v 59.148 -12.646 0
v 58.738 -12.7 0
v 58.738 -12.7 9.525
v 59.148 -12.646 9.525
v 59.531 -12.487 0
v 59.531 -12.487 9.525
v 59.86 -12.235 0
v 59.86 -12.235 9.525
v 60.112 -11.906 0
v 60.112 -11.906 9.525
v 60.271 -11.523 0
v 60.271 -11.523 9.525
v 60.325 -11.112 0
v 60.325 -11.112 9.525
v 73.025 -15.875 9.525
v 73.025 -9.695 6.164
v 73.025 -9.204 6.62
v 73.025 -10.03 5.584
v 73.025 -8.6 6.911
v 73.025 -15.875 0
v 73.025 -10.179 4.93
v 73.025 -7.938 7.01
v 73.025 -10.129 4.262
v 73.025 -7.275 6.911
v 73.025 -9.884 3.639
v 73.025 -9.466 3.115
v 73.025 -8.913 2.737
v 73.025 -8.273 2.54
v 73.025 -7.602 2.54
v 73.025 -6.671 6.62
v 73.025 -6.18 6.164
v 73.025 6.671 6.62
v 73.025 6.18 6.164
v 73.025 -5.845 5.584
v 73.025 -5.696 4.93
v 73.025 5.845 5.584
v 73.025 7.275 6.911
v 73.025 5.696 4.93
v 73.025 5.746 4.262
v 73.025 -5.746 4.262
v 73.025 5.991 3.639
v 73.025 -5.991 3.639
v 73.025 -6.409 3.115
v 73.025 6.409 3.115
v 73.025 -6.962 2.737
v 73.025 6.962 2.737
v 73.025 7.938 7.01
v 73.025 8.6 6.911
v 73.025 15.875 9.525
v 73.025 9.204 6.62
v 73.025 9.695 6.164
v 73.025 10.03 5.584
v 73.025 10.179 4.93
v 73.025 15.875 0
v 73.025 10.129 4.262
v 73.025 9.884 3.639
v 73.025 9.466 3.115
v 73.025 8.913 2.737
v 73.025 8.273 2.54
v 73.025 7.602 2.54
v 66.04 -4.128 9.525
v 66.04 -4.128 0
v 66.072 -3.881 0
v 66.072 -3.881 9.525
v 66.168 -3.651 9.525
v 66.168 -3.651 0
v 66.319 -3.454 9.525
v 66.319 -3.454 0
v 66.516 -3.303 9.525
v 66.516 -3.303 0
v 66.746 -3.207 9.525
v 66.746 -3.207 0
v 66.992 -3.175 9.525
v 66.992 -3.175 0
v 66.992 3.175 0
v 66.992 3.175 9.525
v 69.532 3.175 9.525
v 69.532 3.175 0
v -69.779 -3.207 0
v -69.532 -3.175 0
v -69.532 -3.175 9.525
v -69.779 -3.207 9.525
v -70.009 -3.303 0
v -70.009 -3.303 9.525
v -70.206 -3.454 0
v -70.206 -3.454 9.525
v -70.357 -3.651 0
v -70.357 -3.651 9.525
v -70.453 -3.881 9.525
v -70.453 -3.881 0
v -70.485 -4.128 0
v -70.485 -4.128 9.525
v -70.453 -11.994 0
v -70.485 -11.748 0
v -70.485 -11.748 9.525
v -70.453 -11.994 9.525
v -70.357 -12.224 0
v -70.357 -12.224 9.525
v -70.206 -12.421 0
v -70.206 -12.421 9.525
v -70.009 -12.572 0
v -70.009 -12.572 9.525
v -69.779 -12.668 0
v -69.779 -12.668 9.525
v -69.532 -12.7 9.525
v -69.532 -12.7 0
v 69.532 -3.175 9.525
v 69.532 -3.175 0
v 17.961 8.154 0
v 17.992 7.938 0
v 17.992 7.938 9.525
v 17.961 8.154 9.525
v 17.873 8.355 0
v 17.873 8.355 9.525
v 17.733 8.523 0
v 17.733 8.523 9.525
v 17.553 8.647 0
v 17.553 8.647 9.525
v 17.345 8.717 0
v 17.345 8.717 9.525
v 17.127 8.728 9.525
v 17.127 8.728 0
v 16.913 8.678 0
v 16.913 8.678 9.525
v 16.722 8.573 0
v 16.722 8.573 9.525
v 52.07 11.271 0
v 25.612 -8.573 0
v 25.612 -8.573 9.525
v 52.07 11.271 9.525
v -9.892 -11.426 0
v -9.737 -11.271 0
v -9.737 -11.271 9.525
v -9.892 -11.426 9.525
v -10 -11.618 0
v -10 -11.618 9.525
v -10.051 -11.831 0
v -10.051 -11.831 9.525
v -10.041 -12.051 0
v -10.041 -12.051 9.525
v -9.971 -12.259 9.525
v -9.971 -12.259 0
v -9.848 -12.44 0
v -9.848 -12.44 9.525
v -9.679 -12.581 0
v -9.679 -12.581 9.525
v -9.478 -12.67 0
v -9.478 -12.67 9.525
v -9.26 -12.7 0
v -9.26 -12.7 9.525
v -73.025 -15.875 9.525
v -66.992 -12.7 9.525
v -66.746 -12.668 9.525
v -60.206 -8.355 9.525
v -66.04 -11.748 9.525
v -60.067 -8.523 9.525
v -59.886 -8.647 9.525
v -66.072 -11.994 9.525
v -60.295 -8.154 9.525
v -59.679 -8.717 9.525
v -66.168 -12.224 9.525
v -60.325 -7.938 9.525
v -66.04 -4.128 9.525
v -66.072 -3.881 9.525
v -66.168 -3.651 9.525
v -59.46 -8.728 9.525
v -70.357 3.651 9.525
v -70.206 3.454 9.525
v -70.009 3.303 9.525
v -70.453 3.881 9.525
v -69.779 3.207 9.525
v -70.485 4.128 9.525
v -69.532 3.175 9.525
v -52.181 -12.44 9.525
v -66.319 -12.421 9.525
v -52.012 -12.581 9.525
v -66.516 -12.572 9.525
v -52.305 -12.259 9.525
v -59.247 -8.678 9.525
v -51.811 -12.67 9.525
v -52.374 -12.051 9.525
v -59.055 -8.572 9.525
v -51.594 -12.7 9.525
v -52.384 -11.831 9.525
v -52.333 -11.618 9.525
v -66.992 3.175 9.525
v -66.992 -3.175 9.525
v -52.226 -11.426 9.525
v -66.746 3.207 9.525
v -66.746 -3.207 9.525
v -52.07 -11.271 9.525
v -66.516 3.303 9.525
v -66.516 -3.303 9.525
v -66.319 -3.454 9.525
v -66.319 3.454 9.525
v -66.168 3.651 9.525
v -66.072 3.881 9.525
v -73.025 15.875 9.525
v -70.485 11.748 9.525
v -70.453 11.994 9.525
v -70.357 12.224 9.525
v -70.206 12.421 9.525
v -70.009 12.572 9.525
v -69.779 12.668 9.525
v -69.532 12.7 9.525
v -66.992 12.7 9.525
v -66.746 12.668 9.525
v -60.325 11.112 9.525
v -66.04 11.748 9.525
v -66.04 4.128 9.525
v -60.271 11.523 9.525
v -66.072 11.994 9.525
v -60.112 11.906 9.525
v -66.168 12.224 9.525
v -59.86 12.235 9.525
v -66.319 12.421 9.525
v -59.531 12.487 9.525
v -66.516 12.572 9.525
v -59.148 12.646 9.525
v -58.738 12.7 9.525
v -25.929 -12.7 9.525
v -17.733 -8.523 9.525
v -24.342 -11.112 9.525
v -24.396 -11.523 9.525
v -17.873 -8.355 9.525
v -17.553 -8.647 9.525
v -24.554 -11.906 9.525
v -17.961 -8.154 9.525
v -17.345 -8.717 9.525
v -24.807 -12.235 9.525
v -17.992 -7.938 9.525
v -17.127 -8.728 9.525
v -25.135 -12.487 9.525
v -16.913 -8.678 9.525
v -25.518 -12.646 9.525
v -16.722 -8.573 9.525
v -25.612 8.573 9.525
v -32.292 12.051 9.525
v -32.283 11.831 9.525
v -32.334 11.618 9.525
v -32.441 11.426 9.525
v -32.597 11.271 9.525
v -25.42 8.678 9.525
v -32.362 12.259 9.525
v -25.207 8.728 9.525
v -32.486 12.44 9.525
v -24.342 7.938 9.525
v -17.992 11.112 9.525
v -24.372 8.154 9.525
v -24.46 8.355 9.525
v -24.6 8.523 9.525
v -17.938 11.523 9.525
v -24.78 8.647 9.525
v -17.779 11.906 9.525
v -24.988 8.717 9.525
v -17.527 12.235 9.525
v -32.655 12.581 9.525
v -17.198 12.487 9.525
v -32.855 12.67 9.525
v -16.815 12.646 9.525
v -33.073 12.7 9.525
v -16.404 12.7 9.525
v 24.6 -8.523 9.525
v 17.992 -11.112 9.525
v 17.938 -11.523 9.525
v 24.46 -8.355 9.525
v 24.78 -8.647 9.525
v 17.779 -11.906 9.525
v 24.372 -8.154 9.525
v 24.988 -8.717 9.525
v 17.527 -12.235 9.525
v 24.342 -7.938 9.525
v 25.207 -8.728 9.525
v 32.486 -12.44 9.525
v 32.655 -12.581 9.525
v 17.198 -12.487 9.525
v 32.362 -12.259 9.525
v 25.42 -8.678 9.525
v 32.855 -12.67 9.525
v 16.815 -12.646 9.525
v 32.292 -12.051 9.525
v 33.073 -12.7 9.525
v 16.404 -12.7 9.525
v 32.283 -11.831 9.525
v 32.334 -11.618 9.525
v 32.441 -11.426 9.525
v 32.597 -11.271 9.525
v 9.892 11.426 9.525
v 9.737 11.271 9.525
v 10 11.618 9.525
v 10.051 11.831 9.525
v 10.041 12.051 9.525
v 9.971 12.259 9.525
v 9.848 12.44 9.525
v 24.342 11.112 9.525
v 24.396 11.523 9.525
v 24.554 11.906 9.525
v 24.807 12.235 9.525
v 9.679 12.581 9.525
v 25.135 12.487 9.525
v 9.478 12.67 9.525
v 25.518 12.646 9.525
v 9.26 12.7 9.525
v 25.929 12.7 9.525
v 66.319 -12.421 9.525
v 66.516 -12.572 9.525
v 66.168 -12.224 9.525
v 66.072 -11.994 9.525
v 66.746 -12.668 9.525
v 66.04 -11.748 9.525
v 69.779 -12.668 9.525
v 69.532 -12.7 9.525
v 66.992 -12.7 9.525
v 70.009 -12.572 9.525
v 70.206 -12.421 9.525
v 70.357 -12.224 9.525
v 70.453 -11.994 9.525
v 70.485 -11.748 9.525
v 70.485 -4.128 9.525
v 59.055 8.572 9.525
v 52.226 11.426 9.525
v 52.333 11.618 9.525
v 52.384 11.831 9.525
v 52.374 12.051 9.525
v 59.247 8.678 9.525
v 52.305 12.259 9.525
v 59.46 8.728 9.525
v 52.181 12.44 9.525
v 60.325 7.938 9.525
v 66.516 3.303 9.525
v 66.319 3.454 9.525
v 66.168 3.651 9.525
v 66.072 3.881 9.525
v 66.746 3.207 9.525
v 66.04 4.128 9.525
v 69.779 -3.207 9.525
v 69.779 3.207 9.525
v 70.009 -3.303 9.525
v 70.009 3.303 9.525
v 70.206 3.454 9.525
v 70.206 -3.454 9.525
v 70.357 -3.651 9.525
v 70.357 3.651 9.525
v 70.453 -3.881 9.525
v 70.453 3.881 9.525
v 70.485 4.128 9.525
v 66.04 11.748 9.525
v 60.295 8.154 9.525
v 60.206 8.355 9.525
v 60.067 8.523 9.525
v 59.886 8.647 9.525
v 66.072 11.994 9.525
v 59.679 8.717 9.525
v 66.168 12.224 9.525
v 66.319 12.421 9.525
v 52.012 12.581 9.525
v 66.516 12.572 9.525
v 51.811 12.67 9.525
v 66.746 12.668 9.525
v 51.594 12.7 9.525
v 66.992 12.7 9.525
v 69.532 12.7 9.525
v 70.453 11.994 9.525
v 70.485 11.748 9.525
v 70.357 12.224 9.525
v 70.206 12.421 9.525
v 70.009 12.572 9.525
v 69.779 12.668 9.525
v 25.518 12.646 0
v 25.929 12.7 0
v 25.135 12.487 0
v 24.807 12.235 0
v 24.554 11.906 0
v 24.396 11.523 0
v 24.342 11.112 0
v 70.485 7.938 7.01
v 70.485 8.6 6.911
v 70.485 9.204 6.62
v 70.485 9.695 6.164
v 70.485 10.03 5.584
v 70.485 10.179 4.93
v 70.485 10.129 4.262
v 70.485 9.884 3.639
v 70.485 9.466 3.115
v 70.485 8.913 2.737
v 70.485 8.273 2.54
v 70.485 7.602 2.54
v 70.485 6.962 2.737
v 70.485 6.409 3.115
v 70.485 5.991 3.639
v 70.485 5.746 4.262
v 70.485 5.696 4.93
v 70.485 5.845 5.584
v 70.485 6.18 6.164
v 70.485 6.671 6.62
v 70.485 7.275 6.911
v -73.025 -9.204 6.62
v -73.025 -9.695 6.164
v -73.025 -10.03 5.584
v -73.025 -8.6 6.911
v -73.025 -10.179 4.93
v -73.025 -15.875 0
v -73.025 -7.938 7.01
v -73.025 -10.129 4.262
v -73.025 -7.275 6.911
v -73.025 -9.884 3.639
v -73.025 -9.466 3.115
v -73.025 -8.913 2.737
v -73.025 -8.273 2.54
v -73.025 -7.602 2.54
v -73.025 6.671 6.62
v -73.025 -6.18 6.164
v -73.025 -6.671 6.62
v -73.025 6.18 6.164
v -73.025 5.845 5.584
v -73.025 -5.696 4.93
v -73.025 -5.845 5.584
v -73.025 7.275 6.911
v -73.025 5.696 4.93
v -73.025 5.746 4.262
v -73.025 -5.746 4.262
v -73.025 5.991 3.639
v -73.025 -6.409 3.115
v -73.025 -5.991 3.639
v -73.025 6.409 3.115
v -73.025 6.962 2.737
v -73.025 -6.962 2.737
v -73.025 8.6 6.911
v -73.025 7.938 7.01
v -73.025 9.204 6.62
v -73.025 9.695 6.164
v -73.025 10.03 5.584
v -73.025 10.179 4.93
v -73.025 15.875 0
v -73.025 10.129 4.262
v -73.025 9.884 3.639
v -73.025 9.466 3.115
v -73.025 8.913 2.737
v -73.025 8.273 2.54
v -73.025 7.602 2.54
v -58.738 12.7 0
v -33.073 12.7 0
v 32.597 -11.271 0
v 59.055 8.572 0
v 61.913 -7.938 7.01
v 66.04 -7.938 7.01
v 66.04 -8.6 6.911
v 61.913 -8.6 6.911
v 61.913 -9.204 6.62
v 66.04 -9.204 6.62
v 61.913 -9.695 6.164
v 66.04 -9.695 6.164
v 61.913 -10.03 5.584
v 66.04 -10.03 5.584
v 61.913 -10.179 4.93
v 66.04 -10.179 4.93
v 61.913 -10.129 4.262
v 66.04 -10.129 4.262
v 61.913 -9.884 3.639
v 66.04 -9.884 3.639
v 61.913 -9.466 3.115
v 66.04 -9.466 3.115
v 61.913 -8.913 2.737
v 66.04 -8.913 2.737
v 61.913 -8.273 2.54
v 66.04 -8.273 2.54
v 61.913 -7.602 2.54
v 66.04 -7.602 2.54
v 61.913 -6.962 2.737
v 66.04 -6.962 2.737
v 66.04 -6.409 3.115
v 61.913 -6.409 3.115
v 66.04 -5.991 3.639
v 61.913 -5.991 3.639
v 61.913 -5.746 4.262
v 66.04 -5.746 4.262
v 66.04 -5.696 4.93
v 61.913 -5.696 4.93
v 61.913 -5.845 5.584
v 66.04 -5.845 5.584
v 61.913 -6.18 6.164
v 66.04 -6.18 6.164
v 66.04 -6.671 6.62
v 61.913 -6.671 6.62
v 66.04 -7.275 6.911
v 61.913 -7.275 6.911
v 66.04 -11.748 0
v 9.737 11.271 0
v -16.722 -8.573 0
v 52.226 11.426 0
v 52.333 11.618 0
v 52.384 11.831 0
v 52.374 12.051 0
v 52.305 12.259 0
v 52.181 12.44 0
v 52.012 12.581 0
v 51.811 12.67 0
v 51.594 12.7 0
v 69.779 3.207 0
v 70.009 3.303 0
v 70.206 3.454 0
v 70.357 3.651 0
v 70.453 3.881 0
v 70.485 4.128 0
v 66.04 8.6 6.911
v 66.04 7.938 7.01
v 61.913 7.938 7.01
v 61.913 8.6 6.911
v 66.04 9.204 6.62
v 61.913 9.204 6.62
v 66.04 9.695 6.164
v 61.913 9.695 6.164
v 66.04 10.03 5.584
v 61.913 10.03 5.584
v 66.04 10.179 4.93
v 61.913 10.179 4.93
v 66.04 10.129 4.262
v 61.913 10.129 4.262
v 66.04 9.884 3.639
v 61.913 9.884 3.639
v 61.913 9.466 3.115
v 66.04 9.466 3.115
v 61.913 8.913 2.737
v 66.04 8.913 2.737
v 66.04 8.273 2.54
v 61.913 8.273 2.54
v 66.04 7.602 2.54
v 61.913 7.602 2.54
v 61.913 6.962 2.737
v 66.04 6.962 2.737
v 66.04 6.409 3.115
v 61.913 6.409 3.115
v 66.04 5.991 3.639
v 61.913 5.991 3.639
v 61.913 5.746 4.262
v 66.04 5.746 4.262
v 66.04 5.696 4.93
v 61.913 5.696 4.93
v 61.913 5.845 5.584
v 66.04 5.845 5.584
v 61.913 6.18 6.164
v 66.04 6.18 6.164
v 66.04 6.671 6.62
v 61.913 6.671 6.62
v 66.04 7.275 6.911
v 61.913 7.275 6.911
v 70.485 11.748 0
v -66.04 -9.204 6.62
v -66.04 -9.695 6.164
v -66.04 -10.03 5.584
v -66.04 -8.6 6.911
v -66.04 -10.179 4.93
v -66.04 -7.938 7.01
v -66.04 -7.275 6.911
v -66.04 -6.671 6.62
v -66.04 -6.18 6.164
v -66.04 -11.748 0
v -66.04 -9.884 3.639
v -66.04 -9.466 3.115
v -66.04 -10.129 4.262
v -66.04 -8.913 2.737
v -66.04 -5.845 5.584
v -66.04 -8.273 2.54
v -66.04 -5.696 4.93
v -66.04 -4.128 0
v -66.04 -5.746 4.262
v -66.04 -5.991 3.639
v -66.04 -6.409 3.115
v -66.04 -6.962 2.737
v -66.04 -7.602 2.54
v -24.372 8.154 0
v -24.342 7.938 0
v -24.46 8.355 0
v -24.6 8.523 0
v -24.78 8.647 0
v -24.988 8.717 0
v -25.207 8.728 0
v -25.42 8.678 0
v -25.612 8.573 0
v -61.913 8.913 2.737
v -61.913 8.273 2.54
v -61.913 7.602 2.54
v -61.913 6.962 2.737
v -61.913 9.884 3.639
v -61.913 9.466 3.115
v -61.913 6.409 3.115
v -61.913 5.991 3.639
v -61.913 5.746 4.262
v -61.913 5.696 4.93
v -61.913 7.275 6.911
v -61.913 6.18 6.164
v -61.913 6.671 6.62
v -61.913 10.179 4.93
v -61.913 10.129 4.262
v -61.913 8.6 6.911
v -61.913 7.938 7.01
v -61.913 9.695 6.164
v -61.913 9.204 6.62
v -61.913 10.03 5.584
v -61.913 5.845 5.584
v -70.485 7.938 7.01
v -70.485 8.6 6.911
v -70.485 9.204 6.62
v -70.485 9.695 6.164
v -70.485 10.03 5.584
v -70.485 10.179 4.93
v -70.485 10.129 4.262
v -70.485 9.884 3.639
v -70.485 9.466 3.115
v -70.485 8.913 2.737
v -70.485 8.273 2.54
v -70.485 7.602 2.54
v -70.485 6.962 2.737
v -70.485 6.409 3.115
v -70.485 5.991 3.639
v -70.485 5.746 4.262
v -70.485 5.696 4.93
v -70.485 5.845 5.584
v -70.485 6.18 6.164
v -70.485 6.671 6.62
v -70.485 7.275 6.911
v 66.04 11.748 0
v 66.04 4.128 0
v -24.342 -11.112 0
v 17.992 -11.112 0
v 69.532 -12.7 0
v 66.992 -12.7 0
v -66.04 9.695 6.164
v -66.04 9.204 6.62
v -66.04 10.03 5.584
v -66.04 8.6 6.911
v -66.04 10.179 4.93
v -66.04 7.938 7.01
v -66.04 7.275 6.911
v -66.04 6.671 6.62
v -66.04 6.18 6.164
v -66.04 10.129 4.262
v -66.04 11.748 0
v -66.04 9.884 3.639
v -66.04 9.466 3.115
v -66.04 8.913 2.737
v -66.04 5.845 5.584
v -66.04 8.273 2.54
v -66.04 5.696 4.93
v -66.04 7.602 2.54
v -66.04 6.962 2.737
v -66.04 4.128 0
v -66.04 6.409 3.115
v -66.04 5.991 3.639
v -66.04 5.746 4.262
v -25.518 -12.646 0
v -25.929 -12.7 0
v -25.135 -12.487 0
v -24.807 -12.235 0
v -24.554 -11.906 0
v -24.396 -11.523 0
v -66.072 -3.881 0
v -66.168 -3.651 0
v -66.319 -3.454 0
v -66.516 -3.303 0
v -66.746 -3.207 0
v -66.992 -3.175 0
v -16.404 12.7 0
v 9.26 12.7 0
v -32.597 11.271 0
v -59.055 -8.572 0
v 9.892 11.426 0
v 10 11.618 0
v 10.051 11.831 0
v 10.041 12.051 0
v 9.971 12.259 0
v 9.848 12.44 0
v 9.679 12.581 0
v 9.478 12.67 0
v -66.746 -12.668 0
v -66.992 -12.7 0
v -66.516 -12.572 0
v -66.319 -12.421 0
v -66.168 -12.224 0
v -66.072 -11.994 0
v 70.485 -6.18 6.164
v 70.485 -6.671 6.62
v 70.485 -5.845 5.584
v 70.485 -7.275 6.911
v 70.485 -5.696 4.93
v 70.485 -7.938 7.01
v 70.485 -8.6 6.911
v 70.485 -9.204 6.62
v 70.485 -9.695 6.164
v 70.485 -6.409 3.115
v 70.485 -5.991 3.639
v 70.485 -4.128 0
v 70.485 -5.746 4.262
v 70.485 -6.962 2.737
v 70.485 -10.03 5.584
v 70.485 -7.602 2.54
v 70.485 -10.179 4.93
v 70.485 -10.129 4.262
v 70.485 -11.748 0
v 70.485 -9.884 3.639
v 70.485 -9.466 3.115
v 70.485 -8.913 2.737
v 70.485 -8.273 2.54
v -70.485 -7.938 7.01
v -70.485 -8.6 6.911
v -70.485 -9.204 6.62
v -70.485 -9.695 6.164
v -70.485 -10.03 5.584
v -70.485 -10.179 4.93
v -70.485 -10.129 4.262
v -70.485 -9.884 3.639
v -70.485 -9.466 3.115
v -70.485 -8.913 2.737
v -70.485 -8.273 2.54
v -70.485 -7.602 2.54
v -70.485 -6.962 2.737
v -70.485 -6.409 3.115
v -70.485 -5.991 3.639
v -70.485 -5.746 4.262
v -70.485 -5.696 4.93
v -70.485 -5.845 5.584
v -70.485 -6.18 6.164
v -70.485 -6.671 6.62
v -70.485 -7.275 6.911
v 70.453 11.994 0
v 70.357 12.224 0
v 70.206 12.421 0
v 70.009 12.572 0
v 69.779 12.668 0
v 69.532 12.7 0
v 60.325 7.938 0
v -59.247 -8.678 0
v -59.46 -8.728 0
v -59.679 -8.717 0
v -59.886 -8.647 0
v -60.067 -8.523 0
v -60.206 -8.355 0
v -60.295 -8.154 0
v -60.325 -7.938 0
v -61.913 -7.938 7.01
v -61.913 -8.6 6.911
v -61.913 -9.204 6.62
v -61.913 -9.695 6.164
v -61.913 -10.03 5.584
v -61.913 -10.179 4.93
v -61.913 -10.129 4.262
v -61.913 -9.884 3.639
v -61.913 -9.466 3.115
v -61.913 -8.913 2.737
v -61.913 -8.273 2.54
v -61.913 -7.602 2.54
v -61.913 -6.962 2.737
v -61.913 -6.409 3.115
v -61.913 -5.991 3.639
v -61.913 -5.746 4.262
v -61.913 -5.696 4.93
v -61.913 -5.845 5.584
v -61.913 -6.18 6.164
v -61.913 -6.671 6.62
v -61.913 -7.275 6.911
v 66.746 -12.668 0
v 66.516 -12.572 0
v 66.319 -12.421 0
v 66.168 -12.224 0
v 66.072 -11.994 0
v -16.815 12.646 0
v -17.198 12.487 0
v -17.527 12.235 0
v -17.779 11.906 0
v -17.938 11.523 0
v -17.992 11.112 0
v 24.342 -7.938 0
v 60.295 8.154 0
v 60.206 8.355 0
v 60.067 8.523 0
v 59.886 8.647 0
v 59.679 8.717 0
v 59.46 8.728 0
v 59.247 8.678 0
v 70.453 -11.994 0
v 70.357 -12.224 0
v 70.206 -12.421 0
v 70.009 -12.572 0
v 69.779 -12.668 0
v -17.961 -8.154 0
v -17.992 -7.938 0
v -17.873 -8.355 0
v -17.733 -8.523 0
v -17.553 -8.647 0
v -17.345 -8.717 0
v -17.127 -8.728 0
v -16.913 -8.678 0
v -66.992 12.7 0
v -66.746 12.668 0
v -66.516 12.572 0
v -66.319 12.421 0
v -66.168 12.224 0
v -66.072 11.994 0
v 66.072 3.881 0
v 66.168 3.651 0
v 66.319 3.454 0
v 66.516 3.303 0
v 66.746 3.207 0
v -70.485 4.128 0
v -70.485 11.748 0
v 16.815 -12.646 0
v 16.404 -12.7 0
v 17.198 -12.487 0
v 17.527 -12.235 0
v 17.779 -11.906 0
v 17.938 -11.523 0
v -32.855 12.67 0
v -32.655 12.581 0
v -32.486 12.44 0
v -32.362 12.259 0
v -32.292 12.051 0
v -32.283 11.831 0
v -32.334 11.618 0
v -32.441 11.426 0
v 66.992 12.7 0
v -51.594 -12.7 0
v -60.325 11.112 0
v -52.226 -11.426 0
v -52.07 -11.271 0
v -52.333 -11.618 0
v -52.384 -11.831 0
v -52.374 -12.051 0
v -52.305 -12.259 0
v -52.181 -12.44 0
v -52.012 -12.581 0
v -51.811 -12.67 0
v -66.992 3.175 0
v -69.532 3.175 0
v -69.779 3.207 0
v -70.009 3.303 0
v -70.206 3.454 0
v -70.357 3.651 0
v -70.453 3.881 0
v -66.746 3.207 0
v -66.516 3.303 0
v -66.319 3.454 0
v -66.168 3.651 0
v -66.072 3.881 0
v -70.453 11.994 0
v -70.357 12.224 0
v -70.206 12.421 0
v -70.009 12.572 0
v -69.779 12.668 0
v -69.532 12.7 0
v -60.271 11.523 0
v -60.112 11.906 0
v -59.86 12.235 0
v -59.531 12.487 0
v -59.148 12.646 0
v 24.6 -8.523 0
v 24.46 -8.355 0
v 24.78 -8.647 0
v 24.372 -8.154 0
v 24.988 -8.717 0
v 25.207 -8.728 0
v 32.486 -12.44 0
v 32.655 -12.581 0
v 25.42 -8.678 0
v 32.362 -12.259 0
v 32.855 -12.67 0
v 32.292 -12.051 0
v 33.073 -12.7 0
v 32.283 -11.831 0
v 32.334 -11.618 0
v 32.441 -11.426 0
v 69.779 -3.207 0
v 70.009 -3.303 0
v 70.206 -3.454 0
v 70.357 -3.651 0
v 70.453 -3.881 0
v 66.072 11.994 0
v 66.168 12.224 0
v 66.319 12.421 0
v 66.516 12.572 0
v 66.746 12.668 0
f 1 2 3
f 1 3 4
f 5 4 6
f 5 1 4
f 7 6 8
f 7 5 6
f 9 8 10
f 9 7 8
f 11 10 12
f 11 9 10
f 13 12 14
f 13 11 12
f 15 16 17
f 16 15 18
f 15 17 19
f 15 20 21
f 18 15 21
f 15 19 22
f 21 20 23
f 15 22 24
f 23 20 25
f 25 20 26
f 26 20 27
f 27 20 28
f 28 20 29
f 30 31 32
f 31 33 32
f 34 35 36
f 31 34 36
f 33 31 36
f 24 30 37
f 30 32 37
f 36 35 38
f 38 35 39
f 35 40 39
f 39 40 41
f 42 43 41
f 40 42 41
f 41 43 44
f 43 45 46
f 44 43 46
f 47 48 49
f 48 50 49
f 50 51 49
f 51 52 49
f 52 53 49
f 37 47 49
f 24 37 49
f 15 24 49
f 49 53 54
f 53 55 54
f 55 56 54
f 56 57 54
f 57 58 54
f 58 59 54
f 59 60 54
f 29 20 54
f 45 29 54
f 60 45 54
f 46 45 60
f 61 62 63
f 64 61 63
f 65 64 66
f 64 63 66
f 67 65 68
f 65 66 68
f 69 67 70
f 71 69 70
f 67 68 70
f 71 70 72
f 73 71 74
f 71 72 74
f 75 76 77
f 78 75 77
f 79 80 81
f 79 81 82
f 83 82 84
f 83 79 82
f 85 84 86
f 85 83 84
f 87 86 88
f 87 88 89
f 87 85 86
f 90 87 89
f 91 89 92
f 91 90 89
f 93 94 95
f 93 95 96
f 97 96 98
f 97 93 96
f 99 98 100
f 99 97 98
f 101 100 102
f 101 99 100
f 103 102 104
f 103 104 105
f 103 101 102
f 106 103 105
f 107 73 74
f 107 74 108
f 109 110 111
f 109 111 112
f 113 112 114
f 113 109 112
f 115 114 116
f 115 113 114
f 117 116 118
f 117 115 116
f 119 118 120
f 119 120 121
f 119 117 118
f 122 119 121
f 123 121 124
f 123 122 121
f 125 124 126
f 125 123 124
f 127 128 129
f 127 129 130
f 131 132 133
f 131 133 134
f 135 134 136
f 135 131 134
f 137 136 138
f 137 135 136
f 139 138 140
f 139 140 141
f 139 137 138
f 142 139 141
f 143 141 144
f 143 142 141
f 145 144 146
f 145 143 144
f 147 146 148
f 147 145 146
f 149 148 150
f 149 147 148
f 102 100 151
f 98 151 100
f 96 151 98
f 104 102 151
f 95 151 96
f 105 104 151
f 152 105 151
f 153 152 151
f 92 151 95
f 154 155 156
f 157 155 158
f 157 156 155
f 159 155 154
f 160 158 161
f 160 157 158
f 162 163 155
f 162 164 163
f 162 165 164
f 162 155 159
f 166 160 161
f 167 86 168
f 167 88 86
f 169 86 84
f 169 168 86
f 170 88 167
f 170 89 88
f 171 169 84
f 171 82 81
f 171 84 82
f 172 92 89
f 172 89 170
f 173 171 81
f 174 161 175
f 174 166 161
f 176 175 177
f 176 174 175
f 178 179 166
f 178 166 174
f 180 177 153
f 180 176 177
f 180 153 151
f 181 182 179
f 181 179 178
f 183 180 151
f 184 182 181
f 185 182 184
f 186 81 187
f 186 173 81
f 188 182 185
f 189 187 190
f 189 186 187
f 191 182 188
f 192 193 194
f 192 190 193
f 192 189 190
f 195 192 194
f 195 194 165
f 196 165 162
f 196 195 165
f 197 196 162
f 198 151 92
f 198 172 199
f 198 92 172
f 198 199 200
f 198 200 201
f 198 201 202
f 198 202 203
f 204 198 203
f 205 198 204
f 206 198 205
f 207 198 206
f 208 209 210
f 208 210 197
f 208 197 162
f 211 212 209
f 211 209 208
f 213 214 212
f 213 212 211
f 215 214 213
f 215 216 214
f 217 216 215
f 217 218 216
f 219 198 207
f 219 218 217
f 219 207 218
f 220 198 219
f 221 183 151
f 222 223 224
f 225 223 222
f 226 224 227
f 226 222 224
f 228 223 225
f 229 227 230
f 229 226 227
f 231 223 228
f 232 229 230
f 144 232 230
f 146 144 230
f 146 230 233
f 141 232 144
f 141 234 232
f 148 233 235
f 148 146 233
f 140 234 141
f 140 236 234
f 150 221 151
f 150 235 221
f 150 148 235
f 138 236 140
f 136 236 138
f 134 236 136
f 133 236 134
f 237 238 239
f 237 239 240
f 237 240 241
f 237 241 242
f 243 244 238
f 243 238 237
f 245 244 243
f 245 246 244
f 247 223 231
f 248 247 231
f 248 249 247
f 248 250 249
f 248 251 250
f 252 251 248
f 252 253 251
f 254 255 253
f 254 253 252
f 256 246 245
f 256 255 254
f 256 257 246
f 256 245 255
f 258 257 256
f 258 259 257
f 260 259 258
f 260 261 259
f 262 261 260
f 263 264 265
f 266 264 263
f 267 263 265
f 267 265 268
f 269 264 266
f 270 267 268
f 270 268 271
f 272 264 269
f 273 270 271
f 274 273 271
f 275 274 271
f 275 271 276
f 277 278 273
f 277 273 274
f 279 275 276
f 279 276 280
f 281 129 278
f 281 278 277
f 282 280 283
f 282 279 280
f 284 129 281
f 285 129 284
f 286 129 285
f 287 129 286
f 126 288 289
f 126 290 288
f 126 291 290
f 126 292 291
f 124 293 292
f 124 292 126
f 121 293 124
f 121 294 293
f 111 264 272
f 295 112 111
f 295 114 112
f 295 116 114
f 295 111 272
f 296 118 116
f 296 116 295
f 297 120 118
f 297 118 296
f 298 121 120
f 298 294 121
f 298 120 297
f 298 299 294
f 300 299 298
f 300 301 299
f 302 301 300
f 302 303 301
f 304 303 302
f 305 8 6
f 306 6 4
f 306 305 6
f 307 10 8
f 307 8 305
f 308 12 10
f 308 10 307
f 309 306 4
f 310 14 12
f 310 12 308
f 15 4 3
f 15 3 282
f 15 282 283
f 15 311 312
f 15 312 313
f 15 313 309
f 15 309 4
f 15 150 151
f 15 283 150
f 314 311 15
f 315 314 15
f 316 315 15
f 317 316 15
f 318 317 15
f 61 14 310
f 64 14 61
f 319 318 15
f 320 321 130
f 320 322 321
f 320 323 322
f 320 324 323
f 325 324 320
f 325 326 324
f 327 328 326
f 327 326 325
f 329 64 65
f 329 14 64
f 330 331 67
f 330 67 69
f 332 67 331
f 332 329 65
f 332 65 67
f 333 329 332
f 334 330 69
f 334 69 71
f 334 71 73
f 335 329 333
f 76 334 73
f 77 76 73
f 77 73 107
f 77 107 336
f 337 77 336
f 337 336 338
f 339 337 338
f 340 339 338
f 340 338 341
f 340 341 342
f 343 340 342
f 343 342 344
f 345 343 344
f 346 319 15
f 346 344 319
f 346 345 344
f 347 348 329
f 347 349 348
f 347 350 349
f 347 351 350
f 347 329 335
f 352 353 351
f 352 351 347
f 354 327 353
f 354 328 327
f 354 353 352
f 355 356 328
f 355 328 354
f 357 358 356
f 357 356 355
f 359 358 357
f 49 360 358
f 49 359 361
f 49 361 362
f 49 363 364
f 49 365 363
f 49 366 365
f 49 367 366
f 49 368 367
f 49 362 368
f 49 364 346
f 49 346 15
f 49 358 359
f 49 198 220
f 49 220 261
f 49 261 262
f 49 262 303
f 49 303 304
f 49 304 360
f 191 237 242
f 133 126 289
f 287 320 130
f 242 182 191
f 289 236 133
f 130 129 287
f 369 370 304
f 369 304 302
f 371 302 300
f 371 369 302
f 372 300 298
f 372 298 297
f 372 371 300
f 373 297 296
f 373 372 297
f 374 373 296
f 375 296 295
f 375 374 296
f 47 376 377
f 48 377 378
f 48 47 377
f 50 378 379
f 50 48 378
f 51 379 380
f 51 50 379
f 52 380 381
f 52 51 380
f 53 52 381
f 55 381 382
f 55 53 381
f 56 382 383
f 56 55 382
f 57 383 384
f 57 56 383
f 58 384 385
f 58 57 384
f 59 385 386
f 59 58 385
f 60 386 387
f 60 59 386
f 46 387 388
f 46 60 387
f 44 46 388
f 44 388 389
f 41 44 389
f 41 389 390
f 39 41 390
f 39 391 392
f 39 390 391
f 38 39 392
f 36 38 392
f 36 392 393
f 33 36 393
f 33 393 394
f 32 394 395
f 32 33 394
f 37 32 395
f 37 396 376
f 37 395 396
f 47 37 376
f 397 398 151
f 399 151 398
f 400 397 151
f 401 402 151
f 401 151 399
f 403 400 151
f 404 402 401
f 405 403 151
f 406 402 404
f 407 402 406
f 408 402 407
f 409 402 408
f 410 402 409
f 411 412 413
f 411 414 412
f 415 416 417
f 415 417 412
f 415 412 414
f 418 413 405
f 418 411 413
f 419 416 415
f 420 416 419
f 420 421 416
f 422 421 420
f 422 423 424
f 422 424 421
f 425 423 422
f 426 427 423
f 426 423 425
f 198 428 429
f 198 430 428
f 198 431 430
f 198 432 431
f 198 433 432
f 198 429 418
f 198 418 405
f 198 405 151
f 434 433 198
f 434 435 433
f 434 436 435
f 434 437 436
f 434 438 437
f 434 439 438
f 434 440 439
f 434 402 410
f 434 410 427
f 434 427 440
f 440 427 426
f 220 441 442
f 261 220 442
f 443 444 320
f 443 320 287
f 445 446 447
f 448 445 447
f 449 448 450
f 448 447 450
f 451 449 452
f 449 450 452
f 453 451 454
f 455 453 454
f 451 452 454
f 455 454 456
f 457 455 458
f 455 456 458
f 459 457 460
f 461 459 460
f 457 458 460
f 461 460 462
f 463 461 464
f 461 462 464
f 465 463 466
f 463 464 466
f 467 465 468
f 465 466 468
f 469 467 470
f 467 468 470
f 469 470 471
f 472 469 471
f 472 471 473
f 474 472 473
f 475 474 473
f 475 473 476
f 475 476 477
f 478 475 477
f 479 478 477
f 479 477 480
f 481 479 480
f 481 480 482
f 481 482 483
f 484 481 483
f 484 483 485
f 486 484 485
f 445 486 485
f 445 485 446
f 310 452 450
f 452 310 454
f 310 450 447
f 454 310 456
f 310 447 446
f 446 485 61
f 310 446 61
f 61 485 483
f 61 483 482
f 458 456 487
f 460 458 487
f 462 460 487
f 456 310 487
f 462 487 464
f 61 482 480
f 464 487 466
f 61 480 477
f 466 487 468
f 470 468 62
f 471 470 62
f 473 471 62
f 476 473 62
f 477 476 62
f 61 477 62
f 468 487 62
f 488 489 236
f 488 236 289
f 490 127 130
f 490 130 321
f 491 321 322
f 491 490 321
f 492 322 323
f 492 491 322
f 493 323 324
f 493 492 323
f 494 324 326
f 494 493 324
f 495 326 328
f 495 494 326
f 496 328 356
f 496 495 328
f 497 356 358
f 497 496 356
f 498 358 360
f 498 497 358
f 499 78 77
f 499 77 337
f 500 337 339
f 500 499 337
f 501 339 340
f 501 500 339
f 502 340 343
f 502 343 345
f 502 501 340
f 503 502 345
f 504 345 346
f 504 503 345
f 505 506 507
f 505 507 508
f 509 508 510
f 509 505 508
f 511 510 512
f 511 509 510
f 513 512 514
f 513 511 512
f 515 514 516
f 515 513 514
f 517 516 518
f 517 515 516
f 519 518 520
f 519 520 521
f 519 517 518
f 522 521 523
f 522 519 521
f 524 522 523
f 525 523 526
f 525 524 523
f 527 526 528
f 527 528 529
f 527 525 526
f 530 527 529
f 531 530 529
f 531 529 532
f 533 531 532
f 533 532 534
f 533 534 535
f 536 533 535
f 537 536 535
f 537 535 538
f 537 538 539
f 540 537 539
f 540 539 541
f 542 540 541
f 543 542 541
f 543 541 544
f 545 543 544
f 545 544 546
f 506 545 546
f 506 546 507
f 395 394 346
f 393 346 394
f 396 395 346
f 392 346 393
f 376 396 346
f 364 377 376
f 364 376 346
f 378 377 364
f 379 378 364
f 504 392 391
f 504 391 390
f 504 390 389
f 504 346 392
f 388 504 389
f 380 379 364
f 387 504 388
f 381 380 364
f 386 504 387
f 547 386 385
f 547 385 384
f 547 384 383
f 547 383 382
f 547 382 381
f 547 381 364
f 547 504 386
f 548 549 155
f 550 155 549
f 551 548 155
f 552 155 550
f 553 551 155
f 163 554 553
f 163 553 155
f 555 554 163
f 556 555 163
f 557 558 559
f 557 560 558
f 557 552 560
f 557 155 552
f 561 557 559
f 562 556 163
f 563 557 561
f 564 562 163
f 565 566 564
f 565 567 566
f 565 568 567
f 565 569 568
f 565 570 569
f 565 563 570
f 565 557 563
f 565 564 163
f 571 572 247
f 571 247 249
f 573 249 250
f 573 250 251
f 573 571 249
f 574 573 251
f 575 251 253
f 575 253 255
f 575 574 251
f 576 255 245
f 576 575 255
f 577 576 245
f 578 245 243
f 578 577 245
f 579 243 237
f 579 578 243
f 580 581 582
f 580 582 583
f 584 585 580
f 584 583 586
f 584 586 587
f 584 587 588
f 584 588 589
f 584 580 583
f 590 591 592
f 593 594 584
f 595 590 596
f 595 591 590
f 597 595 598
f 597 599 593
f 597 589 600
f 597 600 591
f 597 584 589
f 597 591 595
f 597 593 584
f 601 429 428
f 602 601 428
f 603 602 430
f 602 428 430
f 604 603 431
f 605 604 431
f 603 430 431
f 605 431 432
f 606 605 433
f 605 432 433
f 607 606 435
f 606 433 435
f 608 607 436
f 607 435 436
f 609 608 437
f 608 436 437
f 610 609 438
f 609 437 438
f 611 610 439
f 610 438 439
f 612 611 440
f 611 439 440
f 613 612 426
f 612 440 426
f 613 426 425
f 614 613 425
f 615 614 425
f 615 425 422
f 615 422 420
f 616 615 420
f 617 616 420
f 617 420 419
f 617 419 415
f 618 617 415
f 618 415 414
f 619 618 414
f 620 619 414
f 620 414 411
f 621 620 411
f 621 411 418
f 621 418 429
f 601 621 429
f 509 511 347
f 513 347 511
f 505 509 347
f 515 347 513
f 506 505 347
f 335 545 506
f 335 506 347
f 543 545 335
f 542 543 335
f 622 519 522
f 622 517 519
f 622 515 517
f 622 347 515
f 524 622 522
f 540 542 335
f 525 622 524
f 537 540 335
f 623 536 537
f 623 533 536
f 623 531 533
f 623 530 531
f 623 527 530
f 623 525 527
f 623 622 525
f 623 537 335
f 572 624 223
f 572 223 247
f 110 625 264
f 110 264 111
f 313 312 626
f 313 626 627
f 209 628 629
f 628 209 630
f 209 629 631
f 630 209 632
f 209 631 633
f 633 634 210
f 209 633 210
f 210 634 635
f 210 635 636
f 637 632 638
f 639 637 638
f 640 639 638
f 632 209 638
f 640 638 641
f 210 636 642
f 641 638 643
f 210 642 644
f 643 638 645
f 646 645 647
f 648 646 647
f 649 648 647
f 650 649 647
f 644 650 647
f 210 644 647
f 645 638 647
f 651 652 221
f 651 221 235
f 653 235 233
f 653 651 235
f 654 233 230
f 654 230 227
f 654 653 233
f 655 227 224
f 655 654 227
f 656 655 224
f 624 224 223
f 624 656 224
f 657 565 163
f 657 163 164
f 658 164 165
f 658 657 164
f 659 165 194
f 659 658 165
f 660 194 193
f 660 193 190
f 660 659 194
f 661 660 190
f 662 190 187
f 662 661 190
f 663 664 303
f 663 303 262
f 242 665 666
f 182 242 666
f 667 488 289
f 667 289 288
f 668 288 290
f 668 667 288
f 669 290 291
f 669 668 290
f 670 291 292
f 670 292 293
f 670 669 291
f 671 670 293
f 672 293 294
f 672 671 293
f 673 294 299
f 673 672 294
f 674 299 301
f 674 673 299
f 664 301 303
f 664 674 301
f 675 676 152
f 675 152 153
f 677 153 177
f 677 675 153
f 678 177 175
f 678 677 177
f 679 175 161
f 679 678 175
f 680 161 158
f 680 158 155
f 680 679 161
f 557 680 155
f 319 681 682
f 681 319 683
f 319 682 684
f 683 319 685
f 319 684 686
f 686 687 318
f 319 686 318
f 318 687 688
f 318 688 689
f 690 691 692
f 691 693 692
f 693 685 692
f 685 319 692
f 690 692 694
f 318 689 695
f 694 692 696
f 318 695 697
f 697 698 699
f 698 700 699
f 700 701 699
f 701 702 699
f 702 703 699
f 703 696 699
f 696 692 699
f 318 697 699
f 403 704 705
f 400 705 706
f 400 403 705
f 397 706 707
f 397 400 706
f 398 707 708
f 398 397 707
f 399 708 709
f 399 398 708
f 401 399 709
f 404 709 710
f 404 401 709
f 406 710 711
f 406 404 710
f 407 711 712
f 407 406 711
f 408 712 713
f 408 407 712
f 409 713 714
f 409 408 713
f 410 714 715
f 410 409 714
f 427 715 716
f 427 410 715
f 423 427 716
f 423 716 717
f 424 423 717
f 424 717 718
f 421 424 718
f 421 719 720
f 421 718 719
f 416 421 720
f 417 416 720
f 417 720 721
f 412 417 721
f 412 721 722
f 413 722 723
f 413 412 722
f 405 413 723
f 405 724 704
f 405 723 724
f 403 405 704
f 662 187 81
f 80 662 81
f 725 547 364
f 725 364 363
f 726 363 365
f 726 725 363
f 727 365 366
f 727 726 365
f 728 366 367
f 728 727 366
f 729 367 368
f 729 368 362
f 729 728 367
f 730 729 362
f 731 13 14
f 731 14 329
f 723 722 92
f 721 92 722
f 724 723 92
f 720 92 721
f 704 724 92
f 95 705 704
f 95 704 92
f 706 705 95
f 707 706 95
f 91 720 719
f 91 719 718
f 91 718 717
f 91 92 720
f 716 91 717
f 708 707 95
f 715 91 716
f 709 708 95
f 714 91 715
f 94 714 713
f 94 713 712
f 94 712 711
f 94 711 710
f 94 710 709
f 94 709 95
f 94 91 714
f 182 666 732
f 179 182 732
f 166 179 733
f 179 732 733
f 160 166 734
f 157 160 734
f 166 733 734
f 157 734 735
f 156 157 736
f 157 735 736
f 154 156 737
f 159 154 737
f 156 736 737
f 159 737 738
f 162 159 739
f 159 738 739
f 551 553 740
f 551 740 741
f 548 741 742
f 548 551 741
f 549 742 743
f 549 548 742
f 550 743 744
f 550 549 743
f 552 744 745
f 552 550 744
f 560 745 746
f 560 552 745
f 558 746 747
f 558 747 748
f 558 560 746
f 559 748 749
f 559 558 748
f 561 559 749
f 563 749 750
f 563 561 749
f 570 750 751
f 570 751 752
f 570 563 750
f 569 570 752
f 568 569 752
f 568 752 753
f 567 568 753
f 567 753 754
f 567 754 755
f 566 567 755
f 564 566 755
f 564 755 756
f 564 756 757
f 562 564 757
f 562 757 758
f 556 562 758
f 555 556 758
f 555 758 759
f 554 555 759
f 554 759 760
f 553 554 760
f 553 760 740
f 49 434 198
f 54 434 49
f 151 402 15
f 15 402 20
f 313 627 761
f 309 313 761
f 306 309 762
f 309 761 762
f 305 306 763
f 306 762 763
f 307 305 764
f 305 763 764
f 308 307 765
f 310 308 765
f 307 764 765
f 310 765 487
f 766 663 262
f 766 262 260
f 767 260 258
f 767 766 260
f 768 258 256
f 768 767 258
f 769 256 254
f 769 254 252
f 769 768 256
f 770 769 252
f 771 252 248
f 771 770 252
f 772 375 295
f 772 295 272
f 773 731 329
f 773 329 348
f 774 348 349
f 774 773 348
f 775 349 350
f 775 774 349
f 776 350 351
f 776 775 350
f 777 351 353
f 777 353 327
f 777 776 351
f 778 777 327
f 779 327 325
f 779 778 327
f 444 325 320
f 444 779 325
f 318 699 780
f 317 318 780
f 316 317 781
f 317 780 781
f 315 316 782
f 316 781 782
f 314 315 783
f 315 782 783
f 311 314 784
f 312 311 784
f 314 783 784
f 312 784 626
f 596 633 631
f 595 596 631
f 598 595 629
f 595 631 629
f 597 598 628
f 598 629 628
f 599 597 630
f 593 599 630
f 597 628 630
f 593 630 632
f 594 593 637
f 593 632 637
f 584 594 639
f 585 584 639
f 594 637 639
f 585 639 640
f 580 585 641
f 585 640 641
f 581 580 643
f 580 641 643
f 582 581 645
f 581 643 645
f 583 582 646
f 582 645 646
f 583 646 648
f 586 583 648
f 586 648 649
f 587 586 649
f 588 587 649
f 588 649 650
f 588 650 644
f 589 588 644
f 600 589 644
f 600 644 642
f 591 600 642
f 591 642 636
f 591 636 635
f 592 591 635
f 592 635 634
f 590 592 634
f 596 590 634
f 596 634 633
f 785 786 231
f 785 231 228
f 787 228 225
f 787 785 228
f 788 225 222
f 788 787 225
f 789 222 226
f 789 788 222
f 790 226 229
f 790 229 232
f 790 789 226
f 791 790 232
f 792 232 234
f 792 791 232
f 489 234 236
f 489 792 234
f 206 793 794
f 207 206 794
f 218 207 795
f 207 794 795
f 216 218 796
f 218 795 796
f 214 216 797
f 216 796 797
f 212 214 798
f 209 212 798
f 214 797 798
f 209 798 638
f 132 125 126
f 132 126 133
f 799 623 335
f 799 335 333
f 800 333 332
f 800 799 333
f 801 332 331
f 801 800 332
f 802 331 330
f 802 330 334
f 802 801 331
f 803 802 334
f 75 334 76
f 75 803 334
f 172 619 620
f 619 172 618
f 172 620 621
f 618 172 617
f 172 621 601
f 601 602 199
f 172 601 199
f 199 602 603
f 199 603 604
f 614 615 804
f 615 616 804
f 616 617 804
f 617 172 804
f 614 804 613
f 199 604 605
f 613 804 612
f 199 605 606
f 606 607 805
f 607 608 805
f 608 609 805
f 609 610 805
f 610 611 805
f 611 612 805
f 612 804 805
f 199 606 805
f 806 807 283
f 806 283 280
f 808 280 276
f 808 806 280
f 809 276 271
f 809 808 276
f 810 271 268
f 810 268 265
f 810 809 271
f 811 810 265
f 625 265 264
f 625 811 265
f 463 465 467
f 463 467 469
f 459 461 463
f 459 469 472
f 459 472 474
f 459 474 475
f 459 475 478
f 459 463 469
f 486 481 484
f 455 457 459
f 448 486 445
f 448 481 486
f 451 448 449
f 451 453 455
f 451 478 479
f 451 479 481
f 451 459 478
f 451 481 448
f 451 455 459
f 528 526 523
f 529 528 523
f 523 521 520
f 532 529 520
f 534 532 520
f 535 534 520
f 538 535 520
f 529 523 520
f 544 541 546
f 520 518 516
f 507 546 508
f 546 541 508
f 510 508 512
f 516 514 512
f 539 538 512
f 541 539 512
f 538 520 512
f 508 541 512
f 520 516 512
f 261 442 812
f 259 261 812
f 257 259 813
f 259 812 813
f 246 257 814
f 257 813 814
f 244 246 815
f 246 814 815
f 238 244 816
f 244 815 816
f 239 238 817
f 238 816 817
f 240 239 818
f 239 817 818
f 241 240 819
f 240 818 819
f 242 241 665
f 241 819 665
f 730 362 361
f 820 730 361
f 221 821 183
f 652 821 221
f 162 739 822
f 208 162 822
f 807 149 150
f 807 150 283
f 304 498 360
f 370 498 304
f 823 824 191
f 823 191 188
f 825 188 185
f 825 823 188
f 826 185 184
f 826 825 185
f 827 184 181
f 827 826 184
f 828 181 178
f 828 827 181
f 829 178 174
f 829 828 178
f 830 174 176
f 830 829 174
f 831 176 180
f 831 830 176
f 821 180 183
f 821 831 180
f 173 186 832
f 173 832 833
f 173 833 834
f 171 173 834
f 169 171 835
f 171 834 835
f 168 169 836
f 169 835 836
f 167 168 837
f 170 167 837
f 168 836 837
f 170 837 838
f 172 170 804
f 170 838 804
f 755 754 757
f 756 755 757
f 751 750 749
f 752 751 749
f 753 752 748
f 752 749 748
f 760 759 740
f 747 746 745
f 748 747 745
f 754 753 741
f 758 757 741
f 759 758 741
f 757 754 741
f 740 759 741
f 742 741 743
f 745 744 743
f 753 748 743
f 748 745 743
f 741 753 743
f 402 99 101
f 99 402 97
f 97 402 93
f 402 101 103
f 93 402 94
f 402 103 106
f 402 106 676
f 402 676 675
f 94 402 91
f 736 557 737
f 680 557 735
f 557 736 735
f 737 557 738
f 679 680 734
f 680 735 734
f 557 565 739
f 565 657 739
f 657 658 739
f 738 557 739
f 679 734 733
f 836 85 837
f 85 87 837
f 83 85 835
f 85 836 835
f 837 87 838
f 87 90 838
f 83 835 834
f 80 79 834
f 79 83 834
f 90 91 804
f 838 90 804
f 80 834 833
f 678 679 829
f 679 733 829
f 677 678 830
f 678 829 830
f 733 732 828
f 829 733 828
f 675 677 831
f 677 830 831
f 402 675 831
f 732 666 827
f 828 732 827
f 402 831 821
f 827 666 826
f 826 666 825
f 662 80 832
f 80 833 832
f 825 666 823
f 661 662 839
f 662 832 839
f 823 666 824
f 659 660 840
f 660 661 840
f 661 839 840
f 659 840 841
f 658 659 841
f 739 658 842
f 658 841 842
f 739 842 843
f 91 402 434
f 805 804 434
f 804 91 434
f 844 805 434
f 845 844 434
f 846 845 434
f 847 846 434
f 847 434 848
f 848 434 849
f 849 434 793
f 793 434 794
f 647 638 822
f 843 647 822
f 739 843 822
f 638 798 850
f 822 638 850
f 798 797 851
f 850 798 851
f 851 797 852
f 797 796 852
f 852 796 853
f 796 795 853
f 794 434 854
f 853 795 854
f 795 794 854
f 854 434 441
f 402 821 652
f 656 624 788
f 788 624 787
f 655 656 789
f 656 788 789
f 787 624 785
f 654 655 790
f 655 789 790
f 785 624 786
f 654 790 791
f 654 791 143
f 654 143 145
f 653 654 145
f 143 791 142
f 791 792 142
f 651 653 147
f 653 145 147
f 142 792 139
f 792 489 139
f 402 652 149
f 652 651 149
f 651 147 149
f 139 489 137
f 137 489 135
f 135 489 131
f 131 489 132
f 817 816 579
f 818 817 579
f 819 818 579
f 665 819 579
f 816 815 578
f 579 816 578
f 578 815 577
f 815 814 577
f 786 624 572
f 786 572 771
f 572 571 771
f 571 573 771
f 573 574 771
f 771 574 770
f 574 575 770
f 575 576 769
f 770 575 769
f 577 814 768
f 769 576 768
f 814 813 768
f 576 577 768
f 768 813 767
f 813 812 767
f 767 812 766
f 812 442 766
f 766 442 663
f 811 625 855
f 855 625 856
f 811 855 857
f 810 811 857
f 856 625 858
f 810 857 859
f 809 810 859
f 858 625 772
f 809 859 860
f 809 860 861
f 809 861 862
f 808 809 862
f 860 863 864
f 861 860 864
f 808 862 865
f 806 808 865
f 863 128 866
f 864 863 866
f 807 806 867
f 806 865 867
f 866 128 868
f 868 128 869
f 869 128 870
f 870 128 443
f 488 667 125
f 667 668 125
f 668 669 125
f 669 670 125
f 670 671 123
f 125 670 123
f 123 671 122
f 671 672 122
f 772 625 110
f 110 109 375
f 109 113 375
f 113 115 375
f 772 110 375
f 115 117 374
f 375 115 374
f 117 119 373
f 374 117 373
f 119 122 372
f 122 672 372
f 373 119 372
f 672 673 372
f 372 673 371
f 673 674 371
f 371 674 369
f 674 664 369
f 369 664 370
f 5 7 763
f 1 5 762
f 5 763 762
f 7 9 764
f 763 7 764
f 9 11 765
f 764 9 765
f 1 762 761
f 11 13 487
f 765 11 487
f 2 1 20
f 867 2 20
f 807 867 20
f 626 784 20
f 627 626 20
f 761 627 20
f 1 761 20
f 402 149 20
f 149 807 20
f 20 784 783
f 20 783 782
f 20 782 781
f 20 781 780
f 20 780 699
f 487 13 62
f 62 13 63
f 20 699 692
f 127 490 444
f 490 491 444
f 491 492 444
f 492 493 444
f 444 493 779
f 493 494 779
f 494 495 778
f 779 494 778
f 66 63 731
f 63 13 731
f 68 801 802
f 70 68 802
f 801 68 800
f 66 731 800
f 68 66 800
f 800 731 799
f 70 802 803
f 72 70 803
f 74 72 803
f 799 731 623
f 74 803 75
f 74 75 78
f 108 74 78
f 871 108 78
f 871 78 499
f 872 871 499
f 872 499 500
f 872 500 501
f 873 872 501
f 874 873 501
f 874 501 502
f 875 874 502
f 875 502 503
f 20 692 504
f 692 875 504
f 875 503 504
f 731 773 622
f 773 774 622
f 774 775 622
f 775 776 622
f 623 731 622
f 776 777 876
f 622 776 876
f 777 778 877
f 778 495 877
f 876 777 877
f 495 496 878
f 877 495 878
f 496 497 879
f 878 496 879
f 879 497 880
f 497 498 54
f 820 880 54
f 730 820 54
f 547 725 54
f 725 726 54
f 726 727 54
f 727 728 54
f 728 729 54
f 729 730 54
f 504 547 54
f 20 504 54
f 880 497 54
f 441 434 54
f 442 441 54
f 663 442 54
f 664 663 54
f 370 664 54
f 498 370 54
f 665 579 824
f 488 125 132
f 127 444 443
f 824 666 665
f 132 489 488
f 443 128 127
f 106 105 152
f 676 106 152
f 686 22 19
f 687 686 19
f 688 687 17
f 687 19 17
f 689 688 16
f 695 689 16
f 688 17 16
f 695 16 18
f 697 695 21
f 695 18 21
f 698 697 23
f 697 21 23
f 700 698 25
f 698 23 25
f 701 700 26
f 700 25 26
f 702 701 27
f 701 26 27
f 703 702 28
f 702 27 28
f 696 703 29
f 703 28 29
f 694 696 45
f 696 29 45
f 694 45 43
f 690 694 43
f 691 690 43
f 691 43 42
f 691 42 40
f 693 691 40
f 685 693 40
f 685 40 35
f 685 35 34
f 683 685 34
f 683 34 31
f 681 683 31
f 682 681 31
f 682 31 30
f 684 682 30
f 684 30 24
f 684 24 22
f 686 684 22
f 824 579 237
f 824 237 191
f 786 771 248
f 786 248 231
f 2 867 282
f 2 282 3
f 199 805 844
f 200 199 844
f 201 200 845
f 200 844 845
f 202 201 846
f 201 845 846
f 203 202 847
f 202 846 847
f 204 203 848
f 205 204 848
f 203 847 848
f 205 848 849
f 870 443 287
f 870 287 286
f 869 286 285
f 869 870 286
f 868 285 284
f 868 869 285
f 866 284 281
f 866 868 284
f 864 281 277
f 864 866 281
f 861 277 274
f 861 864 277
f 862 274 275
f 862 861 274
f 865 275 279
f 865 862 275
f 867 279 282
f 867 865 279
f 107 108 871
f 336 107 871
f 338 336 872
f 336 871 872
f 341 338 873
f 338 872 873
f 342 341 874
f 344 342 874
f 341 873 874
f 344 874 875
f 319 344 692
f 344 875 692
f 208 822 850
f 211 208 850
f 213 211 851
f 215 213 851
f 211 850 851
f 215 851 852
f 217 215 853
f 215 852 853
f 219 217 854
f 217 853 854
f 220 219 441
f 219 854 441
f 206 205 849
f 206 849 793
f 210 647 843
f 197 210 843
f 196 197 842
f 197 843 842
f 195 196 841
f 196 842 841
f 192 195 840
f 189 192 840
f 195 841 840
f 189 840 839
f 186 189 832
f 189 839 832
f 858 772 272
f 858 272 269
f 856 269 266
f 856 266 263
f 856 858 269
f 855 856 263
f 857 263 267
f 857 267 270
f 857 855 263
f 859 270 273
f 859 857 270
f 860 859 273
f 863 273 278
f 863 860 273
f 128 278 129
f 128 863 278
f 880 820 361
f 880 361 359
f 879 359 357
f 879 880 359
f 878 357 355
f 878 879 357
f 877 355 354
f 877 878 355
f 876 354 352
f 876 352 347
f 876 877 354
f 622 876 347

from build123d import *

# Parameters (mm, degrees)
SKETCH2_W                                  = 146.05
SKETCH2_H                                  = 31.75
BOSS_EXTRUDE2_DEPTH                        = 9.525
SKETCH3_R                                  = 2.2479
CUT_EXTRUDE1_DEPTH                         = 11.1125
MIRROR1_AT_THE_SECOND_PLANE_COPY_1_SKETC_R = 2.2479
MIRROR1_AT_THE_SECOND_PLANE_COPY_1_DEPTH   = 11.1125


with BuildPart() as part:
    # Sketch2 → Boss-Extrude2 (new body)
    with BuildSketch(Plane.XY):
        Rectangle(SKETCH2_W, SKETCH2_H)
        with BuildLine():
            Line((-58.7375, 12.7), (-33.072916667, 12.7))
            ThreePointArc((-33.072916667, 12.7), (-32.319899299, 12.157255789), (-32.596666667, 11.27125))
            Line((-32.596666667, 11.27125), (-59.055, -8.5725))
            ThreePointArc((-59.055, -8.5725), (-59.886225791, -8.647451583), (-60.325, -7.9375))
            Line((-60.325, -7.9375), (-60.325, 11.1125))
            ThreePointArc((-60.325, 11.1125), (-59.860032015, 12.235032015), (-58.7375, 12.7))
        make_face(mode=Mode.SUBTRACT)
        with BuildLine():
            Line((-51.59375, -12.7), (-25.929166667, -12.7))
            ThreePointArc((-25.929166667, -12.7), (-24.806634652, -12.235032015), (-24.341666667, -11.1125))
            Line((-24.341666667, -11.1125), (-24.341666667, 7.9375))
            ThreePointArc((-24.341666667, 7.9375), (-24.780440875, 8.647451583), (-25.611666667, 8.5725))
            Line((-25.611666667, 8.5725), (-52.07, -11.27125))
            ThreePointArc((-52.07, -11.27125), (-52.346767368, -12.157255789), (-51.59375, -12.7))
        make_face(mode=Mode.SUBTRACT)
        with BuildLine():
            Line((17.991666667, -11.1125), (17.991666667, 7.9375))
            ThreePointArc((17.991666667, 7.9375), (17.552892458, 8.647451583), (16.721666667, 8.5725))
            Line((16.721666667, 8.5725), (-9.736666667, -11.27125))
            ThreePointArc((-9.736666667, -11.27125), (-10.013434034, -12.157255789), (-9.260416667, -12.7))
            Line((-9.260416667, -12.7), (16.404166667, -12.7))
            ThreePointArc((16.404166667, -12.7), (17.526698682, -12.235032015), (17.991666667, -11.1125))
        make_face(mode=Mode.SUBTRACT)
        with BuildLine():
            Line((-16.721666667, -8.5725), (9.736666667, 11.27125))
            ThreePointArc((9.736666667, 11.27125), (10.013434034, 12.157255789), (9.260416667, 12.7))
            Line((9.260416667, 12.7), (-16.404166667, 12.7))
            ThreePointArc((-16.404166667, 12.7), (-17.526698682, 12.235032015), (-17.991666667, 11.1125))
            Line((-17.991666667, 11.1125), (-17.991666667, -7.9375))
            ThreePointArc((-17.991666667, -7.9375), (-17.552892458, -8.647451583), (-16.721666667, -8.5725))
        make_face(mode=Mode.SUBTRACT)
        with BuildLine():
            Line((60.325, -11.1125), (60.325, 7.9375))
            ThreePointArc((60.325, 7.9375), (59.886225791, 8.647451583), (59.055, 8.5725))
            Line((59.055, 8.5725), (32.596666667, -11.27125))
            ThreePointArc((32.596666667, -11.27125), (32.319899299, -12.157255789), (33.072916667, -12.7))
            Line((33.072916667, -12.7), (58.7375, -12.7))
            ThreePointArc((58.7375, -12.7), (59.860032015, -12.235032015), (60.325, -11.1125))
        make_face(mode=Mode.SUBTRACT)
        with BuildLine():
            Line((25.611666667, -8.5725), (52.07, 11.27125))
            ThreePointArc((52.07, 11.27125), (52.346767368, 12.157255789), (51.59375, 12.7))
            Line((51.59375, 12.7), (25.929166667, 12.7))
            ThreePointArc((25.929166667, 12.7), (24.806634652, 12.235032015), (24.341666667, 11.1125))
            Line((24.341666667, 11.1125), (24.341666667, -7.9375))
            ThreePointArc((24.341666667, -7.9375), (24.780440875, -8.647451583), (25.611666667, -8.5725))
        make_face(mode=Mode.SUBTRACT)
        with BuildLine():
            Line((-69.5325, 12.7), (-66.9925, 12.7))
            ThreePointArc((-66.9925, 12.7), (-66.318980791, 12.421019209), (-66.04, 11.7475))
            Line((-66.04, 11.7475), (-66.04, 4.1275))
            ThreePointArc((-66.04, 4.1275), (-66.318980791, 3.453980791), (-66.9925, 3.175))
            Line((-66.9925, 3.175), (-69.5325, 3.175))
            ThreePointArc((-69.5325, 3.175), (-70.206019209, 3.453980791), (-70.485, 4.1275))
            Line((-70.485, 4.1275), (-70.485, 11.7475))
            ThreePointArc((-70.485, 11.7475), (-70.206019209, 12.421019209), (-69.5325, 12.7))
        make_face(mode=Mode.SUBTRACT)
        with BuildLine():
            Line((-66.04, -11.7475), (-66.04, -4.1275))
            ThreePointArc((-66.04, -4.1275), (-66.318980791, -3.453980791), (-66.9925, -3.175))
            Line((-66.9925, -3.175), (-69.5325, -3.175))
            ThreePointArc((-69.5325, -3.175), (-70.206019209, -3.453980791), (-70.485, -4.1275))
            Line((-70.485, -4.1275), (-70.485, -11.7475))
            ThreePointArc((-70.485, -11.7475), (-70.206019209, -12.421019209), (-69.5325, -12.7))
            Line((-69.5325, -12.7), (-66.9925, -12.7))
            ThreePointArc((-66.9925, -12.7), (-66.318980791, -12.421019209), (-66.04, -11.7475))
        make_face(mode=Mode.SUBTRACT)
        with BuildLine():
            Line((69.5325, -12.7), (66.9925, -12.7))
            ThreePointArc((66.9925, -12.7), (66.318980791, -12.421019209), (66.04, -11.7475))
            Line((66.04, -11.7475), (66.04, -4.1275))
            ThreePointArc((66.04, -4.1275), (66.318980791, -3.453980791), (66.9925, -3.175))
            Line((66.9925, -3.175), (69.5325, -3.175))
            ThreePointArc((69.5325, -3.175), (70.206019209, -3.453980791), (70.485, -4.1275))
            Line((70.485, -4.1275), (70.485, -11.7475))
            ThreePointArc((70.485, -11.7475), (70.206019209, -12.421019209), (69.5325, -12.7))
        make_face(mode=Mode.SUBTRACT)
        with BuildLine():
            Line((66.04, 11.7475), (66.04, 4.1275))
            ThreePointArc((66.04, 4.1275), (66.318980791, 3.453980791), (66.9925, 3.175))
            Line((66.9925, 3.175), (69.5325, 3.175))
            ThreePointArc((69.5325, 3.175), (70.206019209, 3.453980791), (70.485, 4.1275))
            Line((70.485, 4.1275), (70.485, 11.7475))
            ThreePointArc((70.485, 11.7475), (70.206019209, 12.421019209), (69.5325, 12.7))
            Line((69.5325, 12.7), (66.9925, 12.7))
            ThreePointArc((66.9925, 12.7), (66.318980791, 12.421019209), (66.04, 11.7475))
        make_face(mode=Mode.SUBTRACT)
    extrude(amount=BOSS_EXTRUDE2_DEPTH)

    # Sketch3 → Cut-Extrude1 (cut)
    with BuildSketch(Plane.ZY.offset(73.025)):
        with Locations((4.7625, 7.9375)):
            Circle(SKETCH3_R)
    cut_extrude1 = extrude(amount=-CUT_EXTRUDE1_DEPTH, mode=Mode.SUBTRACT)

    # Mirror1: Cut-Extrude1 across plane
    add(cut_extrude1.mirror(Plane(origin=(0, 0, 0), x_dir=(0, 0, 1), z_dir=(1, 0, 0))), mode=Mode.SUBTRACT)

    # Mirror1 at the second plane: Cut-Extrude1 across plane
    add(cut_extrude1.mirror(Plane.ZX), mode=Mode.SUBTRACT)

    # Mirror1 at the second plane copy 1 sketc → Mirror1 at the second plane copy 1 (cut)
    with BuildSketch(Plane(origin=(73.025, 0, 0), x_dir=(0, 0, 1), z_dir=(1, 0, 0))):
        with Locations((4.7625, 7.9375)):
            Circle(MIRROR1_AT_THE_SECOND_PLANE_COPY_1_SKETC_R)
    extrude(amount=-MIRROR1_AT_THE_SECOND_PLANE_COPY_1_DEPTH, mode=Mode.SUBTRACT)


solid = part.part
